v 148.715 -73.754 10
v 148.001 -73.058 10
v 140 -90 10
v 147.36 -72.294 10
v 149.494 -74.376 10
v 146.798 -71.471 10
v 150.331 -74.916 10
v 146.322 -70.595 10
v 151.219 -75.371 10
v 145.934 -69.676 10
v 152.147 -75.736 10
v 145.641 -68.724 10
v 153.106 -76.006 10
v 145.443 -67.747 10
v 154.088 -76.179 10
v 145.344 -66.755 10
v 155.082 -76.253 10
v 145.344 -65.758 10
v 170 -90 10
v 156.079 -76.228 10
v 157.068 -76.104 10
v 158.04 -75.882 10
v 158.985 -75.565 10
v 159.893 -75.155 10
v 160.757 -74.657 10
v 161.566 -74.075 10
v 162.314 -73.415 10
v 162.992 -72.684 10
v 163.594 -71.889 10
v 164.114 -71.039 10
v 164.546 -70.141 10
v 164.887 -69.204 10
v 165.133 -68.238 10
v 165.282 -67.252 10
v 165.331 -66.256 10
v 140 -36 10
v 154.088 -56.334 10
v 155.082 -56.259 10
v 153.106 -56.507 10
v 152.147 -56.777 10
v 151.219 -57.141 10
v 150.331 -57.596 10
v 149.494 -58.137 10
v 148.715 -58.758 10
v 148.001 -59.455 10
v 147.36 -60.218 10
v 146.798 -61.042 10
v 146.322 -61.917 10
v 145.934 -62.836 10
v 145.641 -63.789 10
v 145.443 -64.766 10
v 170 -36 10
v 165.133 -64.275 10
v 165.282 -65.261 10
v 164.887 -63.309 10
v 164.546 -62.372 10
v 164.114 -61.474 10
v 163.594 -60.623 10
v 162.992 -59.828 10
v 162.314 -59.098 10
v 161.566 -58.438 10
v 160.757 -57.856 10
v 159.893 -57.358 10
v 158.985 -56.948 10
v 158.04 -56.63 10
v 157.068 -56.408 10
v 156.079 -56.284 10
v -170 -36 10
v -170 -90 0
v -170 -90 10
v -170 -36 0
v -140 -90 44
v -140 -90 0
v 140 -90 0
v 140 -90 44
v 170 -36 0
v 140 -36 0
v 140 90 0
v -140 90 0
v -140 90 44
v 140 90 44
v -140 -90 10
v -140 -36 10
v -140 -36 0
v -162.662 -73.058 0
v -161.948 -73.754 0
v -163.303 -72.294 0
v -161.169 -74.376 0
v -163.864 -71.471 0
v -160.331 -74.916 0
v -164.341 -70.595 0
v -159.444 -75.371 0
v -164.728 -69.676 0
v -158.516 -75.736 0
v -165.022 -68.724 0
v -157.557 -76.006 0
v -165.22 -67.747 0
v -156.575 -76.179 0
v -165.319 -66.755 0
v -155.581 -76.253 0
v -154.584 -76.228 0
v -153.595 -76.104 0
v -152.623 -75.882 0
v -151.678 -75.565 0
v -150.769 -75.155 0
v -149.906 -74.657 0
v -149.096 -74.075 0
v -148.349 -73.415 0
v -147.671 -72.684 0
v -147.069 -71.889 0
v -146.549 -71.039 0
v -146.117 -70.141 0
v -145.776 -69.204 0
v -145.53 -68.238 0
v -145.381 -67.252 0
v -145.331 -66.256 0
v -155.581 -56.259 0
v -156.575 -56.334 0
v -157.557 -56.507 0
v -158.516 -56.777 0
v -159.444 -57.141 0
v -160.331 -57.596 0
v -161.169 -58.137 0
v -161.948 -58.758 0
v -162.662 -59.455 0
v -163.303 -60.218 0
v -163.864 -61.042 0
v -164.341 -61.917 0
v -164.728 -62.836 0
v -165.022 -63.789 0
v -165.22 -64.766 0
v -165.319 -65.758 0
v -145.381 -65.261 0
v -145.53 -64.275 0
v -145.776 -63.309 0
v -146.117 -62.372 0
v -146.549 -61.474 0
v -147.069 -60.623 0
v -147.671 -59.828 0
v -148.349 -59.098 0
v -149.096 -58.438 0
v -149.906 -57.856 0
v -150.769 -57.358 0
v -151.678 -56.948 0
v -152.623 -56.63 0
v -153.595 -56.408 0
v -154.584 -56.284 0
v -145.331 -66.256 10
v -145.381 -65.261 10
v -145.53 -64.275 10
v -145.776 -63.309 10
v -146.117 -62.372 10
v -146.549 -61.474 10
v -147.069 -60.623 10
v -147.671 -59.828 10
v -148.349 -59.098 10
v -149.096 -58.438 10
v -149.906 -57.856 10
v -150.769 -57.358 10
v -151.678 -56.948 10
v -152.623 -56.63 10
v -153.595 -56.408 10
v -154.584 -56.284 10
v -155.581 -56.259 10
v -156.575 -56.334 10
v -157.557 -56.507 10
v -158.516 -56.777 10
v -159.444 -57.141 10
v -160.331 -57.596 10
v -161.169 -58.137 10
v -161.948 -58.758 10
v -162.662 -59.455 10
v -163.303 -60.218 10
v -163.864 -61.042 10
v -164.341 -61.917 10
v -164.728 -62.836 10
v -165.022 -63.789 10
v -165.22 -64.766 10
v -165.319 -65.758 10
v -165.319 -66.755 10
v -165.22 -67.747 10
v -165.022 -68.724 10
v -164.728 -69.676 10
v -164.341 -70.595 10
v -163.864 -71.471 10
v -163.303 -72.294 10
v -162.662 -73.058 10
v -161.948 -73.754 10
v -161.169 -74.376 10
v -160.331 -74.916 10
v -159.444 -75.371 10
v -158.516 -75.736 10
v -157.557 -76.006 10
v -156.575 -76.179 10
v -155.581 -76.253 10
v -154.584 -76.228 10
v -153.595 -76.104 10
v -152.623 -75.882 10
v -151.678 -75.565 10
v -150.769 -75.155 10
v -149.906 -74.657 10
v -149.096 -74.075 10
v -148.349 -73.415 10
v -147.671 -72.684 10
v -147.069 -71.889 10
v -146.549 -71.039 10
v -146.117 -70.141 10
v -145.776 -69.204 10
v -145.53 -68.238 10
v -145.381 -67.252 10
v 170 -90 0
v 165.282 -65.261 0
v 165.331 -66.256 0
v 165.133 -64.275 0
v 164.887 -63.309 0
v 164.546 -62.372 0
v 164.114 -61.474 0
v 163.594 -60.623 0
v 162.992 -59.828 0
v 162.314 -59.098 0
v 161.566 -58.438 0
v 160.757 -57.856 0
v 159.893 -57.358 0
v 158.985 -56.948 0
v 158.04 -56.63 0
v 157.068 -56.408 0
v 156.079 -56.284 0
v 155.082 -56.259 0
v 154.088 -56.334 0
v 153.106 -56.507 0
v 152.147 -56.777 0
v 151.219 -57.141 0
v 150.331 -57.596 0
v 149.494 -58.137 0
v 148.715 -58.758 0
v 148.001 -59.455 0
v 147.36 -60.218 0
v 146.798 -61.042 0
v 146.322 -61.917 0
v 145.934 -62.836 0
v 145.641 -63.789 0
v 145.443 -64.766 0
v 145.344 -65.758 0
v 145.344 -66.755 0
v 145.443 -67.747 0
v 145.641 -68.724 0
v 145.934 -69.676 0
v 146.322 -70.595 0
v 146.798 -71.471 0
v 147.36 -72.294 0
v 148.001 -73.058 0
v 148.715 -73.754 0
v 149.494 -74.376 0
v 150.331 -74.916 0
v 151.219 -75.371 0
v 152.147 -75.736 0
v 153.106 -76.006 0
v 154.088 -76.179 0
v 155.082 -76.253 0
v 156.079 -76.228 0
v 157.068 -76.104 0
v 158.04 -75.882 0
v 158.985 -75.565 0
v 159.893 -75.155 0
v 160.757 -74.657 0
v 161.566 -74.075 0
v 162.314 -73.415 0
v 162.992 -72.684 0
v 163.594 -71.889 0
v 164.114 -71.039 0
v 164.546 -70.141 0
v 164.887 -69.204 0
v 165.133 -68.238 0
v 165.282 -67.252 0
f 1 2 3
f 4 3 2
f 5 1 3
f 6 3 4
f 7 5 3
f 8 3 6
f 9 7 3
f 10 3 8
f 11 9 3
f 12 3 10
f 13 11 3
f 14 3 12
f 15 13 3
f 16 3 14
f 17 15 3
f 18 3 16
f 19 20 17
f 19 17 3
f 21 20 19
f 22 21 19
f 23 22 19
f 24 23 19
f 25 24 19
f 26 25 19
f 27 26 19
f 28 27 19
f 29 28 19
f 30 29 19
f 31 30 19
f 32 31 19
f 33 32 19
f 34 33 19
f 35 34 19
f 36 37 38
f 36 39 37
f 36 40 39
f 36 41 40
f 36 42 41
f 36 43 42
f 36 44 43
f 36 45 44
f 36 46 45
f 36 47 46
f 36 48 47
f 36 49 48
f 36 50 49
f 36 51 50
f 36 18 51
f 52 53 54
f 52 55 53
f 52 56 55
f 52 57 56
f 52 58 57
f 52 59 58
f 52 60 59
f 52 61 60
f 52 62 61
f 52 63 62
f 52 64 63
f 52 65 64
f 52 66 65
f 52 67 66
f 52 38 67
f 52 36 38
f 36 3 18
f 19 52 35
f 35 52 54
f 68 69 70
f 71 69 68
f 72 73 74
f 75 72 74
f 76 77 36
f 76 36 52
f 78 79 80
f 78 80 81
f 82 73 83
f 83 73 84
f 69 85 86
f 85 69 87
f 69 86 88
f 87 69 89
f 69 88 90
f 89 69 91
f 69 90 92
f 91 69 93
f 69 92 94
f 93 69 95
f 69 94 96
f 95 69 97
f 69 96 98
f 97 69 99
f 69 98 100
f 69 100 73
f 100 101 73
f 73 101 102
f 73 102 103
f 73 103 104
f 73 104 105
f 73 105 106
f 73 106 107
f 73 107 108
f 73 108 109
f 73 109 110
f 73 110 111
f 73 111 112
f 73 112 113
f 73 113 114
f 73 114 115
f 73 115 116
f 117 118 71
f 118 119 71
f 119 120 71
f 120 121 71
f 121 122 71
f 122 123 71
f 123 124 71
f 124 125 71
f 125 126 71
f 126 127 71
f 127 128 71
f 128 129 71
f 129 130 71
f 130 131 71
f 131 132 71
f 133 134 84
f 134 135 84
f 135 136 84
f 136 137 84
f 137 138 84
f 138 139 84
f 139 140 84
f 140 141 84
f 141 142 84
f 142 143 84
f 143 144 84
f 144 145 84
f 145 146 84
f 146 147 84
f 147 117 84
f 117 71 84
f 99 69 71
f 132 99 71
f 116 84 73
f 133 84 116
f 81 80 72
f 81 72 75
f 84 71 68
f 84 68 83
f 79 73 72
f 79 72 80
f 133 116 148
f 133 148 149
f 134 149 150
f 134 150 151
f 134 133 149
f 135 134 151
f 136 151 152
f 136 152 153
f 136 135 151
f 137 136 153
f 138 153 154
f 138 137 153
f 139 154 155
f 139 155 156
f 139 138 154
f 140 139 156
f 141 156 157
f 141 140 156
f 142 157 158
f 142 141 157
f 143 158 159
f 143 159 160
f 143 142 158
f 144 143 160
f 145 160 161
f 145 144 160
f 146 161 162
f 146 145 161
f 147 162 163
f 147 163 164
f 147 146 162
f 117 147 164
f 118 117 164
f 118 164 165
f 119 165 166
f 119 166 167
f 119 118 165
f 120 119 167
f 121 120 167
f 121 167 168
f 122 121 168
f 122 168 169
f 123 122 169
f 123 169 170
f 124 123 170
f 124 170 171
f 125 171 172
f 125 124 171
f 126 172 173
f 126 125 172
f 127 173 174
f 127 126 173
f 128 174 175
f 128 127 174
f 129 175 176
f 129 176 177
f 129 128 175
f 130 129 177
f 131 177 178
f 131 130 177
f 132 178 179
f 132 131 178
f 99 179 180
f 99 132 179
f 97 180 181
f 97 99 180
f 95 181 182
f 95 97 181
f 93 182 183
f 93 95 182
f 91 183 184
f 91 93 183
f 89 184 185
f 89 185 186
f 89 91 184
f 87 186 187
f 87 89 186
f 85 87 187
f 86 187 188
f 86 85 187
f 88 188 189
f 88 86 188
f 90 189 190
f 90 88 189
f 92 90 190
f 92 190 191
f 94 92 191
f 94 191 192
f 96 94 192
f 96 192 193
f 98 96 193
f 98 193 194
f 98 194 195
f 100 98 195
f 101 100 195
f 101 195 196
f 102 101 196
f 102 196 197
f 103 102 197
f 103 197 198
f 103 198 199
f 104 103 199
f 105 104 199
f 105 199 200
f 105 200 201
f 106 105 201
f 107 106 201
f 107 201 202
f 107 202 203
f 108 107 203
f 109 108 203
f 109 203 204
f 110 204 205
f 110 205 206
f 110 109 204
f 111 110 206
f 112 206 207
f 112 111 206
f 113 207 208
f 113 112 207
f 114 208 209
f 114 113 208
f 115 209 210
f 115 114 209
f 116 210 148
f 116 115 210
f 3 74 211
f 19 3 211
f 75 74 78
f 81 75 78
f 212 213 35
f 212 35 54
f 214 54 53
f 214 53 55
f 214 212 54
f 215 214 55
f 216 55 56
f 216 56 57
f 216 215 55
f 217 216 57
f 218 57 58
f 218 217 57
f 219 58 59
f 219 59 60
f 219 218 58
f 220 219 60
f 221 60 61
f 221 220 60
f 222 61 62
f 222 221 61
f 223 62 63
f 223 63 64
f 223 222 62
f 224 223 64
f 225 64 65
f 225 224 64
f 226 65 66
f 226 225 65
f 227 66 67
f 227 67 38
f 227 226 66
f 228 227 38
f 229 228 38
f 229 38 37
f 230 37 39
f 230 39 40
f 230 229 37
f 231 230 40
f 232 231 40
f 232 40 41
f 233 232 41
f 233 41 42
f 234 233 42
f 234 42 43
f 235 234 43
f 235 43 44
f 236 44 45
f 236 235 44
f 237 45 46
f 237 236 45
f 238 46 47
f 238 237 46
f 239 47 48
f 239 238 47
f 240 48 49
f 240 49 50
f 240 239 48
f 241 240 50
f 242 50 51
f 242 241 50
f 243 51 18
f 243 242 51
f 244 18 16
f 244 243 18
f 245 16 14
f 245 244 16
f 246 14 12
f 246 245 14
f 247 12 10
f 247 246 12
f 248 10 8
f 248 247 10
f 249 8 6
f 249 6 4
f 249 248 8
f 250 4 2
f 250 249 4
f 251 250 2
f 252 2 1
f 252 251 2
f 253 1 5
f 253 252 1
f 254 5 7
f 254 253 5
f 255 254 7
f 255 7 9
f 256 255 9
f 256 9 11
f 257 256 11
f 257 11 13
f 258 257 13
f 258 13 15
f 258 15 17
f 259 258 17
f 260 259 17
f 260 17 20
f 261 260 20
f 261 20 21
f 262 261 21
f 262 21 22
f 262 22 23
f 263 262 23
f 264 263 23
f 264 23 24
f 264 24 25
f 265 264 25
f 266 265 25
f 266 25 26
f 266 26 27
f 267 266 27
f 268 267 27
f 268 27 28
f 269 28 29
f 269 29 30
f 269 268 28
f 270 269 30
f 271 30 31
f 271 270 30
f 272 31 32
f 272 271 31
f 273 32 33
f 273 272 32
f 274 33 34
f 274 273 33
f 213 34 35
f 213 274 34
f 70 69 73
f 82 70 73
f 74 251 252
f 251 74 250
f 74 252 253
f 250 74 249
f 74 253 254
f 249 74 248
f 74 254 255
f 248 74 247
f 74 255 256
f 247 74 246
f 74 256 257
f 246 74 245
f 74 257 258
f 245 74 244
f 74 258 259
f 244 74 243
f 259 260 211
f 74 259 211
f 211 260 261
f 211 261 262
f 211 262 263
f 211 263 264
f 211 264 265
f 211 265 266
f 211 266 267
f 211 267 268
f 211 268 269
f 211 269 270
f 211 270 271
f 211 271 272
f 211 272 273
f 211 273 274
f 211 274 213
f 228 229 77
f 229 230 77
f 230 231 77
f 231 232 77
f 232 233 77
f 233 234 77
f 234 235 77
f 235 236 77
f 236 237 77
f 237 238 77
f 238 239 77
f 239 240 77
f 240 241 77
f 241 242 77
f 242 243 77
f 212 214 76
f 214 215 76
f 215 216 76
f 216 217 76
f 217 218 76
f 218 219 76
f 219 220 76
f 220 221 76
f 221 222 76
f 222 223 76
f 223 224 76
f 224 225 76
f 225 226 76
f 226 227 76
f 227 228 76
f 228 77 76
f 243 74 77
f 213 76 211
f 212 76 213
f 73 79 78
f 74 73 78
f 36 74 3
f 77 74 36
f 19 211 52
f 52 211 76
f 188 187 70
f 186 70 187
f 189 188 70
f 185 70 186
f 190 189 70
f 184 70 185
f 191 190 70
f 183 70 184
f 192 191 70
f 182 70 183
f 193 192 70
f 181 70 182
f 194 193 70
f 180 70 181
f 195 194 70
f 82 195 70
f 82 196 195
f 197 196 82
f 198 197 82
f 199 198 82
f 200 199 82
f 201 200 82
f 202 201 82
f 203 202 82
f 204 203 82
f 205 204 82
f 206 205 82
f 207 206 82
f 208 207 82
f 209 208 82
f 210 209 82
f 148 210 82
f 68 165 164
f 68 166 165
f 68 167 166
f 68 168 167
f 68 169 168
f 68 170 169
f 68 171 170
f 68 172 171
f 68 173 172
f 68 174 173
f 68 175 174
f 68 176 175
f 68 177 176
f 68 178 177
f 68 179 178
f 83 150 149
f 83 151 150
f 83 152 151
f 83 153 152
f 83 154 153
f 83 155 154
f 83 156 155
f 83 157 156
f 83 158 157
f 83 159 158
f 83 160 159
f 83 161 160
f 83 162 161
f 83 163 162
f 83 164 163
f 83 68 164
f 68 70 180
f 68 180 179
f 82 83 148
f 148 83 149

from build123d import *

# Parameters (mm, degrees)
SKETCH_W     = 280
SKETCH_H     = 180
PAD_DEPTH    = 44
SKETCH001_W  = 30
SKETCH001_H  = 54
SKETCH001_R  = 10
PAD001_DEPTH = 10


with BuildPart() as pad:
    # Sketch → Pad (new body)
    with BuildSketch(Plane.XY):
        Rectangle(SKETCH_W, SKETCH_H)
    extrude(amount=PAD_DEPTH)


with BuildPart() as pad001:
    # Sketch001 → Pad001 (new body)
    with BuildSketch(Plane.XY):
        with Locations((155, -63)):
            Rectangle(SKETCH001_W, SKETCH001_H)
        with Locations((155.331384, -66.256242)):
            Circle(SKETCH001_R, mode=Mode.SUBTRACT)
        with Locations((-155, -63)):
            Rectangle(SKETCH001_W, SKETCH001_H)
        with Locations((-155.331384, -66.256242)):
            Circle(SKETCH001_R, mode=Mode.SUBTRACT)
    extrude(amount=PAD001_DEPTH)


solid = Compound([pad.part, pad001.part])
